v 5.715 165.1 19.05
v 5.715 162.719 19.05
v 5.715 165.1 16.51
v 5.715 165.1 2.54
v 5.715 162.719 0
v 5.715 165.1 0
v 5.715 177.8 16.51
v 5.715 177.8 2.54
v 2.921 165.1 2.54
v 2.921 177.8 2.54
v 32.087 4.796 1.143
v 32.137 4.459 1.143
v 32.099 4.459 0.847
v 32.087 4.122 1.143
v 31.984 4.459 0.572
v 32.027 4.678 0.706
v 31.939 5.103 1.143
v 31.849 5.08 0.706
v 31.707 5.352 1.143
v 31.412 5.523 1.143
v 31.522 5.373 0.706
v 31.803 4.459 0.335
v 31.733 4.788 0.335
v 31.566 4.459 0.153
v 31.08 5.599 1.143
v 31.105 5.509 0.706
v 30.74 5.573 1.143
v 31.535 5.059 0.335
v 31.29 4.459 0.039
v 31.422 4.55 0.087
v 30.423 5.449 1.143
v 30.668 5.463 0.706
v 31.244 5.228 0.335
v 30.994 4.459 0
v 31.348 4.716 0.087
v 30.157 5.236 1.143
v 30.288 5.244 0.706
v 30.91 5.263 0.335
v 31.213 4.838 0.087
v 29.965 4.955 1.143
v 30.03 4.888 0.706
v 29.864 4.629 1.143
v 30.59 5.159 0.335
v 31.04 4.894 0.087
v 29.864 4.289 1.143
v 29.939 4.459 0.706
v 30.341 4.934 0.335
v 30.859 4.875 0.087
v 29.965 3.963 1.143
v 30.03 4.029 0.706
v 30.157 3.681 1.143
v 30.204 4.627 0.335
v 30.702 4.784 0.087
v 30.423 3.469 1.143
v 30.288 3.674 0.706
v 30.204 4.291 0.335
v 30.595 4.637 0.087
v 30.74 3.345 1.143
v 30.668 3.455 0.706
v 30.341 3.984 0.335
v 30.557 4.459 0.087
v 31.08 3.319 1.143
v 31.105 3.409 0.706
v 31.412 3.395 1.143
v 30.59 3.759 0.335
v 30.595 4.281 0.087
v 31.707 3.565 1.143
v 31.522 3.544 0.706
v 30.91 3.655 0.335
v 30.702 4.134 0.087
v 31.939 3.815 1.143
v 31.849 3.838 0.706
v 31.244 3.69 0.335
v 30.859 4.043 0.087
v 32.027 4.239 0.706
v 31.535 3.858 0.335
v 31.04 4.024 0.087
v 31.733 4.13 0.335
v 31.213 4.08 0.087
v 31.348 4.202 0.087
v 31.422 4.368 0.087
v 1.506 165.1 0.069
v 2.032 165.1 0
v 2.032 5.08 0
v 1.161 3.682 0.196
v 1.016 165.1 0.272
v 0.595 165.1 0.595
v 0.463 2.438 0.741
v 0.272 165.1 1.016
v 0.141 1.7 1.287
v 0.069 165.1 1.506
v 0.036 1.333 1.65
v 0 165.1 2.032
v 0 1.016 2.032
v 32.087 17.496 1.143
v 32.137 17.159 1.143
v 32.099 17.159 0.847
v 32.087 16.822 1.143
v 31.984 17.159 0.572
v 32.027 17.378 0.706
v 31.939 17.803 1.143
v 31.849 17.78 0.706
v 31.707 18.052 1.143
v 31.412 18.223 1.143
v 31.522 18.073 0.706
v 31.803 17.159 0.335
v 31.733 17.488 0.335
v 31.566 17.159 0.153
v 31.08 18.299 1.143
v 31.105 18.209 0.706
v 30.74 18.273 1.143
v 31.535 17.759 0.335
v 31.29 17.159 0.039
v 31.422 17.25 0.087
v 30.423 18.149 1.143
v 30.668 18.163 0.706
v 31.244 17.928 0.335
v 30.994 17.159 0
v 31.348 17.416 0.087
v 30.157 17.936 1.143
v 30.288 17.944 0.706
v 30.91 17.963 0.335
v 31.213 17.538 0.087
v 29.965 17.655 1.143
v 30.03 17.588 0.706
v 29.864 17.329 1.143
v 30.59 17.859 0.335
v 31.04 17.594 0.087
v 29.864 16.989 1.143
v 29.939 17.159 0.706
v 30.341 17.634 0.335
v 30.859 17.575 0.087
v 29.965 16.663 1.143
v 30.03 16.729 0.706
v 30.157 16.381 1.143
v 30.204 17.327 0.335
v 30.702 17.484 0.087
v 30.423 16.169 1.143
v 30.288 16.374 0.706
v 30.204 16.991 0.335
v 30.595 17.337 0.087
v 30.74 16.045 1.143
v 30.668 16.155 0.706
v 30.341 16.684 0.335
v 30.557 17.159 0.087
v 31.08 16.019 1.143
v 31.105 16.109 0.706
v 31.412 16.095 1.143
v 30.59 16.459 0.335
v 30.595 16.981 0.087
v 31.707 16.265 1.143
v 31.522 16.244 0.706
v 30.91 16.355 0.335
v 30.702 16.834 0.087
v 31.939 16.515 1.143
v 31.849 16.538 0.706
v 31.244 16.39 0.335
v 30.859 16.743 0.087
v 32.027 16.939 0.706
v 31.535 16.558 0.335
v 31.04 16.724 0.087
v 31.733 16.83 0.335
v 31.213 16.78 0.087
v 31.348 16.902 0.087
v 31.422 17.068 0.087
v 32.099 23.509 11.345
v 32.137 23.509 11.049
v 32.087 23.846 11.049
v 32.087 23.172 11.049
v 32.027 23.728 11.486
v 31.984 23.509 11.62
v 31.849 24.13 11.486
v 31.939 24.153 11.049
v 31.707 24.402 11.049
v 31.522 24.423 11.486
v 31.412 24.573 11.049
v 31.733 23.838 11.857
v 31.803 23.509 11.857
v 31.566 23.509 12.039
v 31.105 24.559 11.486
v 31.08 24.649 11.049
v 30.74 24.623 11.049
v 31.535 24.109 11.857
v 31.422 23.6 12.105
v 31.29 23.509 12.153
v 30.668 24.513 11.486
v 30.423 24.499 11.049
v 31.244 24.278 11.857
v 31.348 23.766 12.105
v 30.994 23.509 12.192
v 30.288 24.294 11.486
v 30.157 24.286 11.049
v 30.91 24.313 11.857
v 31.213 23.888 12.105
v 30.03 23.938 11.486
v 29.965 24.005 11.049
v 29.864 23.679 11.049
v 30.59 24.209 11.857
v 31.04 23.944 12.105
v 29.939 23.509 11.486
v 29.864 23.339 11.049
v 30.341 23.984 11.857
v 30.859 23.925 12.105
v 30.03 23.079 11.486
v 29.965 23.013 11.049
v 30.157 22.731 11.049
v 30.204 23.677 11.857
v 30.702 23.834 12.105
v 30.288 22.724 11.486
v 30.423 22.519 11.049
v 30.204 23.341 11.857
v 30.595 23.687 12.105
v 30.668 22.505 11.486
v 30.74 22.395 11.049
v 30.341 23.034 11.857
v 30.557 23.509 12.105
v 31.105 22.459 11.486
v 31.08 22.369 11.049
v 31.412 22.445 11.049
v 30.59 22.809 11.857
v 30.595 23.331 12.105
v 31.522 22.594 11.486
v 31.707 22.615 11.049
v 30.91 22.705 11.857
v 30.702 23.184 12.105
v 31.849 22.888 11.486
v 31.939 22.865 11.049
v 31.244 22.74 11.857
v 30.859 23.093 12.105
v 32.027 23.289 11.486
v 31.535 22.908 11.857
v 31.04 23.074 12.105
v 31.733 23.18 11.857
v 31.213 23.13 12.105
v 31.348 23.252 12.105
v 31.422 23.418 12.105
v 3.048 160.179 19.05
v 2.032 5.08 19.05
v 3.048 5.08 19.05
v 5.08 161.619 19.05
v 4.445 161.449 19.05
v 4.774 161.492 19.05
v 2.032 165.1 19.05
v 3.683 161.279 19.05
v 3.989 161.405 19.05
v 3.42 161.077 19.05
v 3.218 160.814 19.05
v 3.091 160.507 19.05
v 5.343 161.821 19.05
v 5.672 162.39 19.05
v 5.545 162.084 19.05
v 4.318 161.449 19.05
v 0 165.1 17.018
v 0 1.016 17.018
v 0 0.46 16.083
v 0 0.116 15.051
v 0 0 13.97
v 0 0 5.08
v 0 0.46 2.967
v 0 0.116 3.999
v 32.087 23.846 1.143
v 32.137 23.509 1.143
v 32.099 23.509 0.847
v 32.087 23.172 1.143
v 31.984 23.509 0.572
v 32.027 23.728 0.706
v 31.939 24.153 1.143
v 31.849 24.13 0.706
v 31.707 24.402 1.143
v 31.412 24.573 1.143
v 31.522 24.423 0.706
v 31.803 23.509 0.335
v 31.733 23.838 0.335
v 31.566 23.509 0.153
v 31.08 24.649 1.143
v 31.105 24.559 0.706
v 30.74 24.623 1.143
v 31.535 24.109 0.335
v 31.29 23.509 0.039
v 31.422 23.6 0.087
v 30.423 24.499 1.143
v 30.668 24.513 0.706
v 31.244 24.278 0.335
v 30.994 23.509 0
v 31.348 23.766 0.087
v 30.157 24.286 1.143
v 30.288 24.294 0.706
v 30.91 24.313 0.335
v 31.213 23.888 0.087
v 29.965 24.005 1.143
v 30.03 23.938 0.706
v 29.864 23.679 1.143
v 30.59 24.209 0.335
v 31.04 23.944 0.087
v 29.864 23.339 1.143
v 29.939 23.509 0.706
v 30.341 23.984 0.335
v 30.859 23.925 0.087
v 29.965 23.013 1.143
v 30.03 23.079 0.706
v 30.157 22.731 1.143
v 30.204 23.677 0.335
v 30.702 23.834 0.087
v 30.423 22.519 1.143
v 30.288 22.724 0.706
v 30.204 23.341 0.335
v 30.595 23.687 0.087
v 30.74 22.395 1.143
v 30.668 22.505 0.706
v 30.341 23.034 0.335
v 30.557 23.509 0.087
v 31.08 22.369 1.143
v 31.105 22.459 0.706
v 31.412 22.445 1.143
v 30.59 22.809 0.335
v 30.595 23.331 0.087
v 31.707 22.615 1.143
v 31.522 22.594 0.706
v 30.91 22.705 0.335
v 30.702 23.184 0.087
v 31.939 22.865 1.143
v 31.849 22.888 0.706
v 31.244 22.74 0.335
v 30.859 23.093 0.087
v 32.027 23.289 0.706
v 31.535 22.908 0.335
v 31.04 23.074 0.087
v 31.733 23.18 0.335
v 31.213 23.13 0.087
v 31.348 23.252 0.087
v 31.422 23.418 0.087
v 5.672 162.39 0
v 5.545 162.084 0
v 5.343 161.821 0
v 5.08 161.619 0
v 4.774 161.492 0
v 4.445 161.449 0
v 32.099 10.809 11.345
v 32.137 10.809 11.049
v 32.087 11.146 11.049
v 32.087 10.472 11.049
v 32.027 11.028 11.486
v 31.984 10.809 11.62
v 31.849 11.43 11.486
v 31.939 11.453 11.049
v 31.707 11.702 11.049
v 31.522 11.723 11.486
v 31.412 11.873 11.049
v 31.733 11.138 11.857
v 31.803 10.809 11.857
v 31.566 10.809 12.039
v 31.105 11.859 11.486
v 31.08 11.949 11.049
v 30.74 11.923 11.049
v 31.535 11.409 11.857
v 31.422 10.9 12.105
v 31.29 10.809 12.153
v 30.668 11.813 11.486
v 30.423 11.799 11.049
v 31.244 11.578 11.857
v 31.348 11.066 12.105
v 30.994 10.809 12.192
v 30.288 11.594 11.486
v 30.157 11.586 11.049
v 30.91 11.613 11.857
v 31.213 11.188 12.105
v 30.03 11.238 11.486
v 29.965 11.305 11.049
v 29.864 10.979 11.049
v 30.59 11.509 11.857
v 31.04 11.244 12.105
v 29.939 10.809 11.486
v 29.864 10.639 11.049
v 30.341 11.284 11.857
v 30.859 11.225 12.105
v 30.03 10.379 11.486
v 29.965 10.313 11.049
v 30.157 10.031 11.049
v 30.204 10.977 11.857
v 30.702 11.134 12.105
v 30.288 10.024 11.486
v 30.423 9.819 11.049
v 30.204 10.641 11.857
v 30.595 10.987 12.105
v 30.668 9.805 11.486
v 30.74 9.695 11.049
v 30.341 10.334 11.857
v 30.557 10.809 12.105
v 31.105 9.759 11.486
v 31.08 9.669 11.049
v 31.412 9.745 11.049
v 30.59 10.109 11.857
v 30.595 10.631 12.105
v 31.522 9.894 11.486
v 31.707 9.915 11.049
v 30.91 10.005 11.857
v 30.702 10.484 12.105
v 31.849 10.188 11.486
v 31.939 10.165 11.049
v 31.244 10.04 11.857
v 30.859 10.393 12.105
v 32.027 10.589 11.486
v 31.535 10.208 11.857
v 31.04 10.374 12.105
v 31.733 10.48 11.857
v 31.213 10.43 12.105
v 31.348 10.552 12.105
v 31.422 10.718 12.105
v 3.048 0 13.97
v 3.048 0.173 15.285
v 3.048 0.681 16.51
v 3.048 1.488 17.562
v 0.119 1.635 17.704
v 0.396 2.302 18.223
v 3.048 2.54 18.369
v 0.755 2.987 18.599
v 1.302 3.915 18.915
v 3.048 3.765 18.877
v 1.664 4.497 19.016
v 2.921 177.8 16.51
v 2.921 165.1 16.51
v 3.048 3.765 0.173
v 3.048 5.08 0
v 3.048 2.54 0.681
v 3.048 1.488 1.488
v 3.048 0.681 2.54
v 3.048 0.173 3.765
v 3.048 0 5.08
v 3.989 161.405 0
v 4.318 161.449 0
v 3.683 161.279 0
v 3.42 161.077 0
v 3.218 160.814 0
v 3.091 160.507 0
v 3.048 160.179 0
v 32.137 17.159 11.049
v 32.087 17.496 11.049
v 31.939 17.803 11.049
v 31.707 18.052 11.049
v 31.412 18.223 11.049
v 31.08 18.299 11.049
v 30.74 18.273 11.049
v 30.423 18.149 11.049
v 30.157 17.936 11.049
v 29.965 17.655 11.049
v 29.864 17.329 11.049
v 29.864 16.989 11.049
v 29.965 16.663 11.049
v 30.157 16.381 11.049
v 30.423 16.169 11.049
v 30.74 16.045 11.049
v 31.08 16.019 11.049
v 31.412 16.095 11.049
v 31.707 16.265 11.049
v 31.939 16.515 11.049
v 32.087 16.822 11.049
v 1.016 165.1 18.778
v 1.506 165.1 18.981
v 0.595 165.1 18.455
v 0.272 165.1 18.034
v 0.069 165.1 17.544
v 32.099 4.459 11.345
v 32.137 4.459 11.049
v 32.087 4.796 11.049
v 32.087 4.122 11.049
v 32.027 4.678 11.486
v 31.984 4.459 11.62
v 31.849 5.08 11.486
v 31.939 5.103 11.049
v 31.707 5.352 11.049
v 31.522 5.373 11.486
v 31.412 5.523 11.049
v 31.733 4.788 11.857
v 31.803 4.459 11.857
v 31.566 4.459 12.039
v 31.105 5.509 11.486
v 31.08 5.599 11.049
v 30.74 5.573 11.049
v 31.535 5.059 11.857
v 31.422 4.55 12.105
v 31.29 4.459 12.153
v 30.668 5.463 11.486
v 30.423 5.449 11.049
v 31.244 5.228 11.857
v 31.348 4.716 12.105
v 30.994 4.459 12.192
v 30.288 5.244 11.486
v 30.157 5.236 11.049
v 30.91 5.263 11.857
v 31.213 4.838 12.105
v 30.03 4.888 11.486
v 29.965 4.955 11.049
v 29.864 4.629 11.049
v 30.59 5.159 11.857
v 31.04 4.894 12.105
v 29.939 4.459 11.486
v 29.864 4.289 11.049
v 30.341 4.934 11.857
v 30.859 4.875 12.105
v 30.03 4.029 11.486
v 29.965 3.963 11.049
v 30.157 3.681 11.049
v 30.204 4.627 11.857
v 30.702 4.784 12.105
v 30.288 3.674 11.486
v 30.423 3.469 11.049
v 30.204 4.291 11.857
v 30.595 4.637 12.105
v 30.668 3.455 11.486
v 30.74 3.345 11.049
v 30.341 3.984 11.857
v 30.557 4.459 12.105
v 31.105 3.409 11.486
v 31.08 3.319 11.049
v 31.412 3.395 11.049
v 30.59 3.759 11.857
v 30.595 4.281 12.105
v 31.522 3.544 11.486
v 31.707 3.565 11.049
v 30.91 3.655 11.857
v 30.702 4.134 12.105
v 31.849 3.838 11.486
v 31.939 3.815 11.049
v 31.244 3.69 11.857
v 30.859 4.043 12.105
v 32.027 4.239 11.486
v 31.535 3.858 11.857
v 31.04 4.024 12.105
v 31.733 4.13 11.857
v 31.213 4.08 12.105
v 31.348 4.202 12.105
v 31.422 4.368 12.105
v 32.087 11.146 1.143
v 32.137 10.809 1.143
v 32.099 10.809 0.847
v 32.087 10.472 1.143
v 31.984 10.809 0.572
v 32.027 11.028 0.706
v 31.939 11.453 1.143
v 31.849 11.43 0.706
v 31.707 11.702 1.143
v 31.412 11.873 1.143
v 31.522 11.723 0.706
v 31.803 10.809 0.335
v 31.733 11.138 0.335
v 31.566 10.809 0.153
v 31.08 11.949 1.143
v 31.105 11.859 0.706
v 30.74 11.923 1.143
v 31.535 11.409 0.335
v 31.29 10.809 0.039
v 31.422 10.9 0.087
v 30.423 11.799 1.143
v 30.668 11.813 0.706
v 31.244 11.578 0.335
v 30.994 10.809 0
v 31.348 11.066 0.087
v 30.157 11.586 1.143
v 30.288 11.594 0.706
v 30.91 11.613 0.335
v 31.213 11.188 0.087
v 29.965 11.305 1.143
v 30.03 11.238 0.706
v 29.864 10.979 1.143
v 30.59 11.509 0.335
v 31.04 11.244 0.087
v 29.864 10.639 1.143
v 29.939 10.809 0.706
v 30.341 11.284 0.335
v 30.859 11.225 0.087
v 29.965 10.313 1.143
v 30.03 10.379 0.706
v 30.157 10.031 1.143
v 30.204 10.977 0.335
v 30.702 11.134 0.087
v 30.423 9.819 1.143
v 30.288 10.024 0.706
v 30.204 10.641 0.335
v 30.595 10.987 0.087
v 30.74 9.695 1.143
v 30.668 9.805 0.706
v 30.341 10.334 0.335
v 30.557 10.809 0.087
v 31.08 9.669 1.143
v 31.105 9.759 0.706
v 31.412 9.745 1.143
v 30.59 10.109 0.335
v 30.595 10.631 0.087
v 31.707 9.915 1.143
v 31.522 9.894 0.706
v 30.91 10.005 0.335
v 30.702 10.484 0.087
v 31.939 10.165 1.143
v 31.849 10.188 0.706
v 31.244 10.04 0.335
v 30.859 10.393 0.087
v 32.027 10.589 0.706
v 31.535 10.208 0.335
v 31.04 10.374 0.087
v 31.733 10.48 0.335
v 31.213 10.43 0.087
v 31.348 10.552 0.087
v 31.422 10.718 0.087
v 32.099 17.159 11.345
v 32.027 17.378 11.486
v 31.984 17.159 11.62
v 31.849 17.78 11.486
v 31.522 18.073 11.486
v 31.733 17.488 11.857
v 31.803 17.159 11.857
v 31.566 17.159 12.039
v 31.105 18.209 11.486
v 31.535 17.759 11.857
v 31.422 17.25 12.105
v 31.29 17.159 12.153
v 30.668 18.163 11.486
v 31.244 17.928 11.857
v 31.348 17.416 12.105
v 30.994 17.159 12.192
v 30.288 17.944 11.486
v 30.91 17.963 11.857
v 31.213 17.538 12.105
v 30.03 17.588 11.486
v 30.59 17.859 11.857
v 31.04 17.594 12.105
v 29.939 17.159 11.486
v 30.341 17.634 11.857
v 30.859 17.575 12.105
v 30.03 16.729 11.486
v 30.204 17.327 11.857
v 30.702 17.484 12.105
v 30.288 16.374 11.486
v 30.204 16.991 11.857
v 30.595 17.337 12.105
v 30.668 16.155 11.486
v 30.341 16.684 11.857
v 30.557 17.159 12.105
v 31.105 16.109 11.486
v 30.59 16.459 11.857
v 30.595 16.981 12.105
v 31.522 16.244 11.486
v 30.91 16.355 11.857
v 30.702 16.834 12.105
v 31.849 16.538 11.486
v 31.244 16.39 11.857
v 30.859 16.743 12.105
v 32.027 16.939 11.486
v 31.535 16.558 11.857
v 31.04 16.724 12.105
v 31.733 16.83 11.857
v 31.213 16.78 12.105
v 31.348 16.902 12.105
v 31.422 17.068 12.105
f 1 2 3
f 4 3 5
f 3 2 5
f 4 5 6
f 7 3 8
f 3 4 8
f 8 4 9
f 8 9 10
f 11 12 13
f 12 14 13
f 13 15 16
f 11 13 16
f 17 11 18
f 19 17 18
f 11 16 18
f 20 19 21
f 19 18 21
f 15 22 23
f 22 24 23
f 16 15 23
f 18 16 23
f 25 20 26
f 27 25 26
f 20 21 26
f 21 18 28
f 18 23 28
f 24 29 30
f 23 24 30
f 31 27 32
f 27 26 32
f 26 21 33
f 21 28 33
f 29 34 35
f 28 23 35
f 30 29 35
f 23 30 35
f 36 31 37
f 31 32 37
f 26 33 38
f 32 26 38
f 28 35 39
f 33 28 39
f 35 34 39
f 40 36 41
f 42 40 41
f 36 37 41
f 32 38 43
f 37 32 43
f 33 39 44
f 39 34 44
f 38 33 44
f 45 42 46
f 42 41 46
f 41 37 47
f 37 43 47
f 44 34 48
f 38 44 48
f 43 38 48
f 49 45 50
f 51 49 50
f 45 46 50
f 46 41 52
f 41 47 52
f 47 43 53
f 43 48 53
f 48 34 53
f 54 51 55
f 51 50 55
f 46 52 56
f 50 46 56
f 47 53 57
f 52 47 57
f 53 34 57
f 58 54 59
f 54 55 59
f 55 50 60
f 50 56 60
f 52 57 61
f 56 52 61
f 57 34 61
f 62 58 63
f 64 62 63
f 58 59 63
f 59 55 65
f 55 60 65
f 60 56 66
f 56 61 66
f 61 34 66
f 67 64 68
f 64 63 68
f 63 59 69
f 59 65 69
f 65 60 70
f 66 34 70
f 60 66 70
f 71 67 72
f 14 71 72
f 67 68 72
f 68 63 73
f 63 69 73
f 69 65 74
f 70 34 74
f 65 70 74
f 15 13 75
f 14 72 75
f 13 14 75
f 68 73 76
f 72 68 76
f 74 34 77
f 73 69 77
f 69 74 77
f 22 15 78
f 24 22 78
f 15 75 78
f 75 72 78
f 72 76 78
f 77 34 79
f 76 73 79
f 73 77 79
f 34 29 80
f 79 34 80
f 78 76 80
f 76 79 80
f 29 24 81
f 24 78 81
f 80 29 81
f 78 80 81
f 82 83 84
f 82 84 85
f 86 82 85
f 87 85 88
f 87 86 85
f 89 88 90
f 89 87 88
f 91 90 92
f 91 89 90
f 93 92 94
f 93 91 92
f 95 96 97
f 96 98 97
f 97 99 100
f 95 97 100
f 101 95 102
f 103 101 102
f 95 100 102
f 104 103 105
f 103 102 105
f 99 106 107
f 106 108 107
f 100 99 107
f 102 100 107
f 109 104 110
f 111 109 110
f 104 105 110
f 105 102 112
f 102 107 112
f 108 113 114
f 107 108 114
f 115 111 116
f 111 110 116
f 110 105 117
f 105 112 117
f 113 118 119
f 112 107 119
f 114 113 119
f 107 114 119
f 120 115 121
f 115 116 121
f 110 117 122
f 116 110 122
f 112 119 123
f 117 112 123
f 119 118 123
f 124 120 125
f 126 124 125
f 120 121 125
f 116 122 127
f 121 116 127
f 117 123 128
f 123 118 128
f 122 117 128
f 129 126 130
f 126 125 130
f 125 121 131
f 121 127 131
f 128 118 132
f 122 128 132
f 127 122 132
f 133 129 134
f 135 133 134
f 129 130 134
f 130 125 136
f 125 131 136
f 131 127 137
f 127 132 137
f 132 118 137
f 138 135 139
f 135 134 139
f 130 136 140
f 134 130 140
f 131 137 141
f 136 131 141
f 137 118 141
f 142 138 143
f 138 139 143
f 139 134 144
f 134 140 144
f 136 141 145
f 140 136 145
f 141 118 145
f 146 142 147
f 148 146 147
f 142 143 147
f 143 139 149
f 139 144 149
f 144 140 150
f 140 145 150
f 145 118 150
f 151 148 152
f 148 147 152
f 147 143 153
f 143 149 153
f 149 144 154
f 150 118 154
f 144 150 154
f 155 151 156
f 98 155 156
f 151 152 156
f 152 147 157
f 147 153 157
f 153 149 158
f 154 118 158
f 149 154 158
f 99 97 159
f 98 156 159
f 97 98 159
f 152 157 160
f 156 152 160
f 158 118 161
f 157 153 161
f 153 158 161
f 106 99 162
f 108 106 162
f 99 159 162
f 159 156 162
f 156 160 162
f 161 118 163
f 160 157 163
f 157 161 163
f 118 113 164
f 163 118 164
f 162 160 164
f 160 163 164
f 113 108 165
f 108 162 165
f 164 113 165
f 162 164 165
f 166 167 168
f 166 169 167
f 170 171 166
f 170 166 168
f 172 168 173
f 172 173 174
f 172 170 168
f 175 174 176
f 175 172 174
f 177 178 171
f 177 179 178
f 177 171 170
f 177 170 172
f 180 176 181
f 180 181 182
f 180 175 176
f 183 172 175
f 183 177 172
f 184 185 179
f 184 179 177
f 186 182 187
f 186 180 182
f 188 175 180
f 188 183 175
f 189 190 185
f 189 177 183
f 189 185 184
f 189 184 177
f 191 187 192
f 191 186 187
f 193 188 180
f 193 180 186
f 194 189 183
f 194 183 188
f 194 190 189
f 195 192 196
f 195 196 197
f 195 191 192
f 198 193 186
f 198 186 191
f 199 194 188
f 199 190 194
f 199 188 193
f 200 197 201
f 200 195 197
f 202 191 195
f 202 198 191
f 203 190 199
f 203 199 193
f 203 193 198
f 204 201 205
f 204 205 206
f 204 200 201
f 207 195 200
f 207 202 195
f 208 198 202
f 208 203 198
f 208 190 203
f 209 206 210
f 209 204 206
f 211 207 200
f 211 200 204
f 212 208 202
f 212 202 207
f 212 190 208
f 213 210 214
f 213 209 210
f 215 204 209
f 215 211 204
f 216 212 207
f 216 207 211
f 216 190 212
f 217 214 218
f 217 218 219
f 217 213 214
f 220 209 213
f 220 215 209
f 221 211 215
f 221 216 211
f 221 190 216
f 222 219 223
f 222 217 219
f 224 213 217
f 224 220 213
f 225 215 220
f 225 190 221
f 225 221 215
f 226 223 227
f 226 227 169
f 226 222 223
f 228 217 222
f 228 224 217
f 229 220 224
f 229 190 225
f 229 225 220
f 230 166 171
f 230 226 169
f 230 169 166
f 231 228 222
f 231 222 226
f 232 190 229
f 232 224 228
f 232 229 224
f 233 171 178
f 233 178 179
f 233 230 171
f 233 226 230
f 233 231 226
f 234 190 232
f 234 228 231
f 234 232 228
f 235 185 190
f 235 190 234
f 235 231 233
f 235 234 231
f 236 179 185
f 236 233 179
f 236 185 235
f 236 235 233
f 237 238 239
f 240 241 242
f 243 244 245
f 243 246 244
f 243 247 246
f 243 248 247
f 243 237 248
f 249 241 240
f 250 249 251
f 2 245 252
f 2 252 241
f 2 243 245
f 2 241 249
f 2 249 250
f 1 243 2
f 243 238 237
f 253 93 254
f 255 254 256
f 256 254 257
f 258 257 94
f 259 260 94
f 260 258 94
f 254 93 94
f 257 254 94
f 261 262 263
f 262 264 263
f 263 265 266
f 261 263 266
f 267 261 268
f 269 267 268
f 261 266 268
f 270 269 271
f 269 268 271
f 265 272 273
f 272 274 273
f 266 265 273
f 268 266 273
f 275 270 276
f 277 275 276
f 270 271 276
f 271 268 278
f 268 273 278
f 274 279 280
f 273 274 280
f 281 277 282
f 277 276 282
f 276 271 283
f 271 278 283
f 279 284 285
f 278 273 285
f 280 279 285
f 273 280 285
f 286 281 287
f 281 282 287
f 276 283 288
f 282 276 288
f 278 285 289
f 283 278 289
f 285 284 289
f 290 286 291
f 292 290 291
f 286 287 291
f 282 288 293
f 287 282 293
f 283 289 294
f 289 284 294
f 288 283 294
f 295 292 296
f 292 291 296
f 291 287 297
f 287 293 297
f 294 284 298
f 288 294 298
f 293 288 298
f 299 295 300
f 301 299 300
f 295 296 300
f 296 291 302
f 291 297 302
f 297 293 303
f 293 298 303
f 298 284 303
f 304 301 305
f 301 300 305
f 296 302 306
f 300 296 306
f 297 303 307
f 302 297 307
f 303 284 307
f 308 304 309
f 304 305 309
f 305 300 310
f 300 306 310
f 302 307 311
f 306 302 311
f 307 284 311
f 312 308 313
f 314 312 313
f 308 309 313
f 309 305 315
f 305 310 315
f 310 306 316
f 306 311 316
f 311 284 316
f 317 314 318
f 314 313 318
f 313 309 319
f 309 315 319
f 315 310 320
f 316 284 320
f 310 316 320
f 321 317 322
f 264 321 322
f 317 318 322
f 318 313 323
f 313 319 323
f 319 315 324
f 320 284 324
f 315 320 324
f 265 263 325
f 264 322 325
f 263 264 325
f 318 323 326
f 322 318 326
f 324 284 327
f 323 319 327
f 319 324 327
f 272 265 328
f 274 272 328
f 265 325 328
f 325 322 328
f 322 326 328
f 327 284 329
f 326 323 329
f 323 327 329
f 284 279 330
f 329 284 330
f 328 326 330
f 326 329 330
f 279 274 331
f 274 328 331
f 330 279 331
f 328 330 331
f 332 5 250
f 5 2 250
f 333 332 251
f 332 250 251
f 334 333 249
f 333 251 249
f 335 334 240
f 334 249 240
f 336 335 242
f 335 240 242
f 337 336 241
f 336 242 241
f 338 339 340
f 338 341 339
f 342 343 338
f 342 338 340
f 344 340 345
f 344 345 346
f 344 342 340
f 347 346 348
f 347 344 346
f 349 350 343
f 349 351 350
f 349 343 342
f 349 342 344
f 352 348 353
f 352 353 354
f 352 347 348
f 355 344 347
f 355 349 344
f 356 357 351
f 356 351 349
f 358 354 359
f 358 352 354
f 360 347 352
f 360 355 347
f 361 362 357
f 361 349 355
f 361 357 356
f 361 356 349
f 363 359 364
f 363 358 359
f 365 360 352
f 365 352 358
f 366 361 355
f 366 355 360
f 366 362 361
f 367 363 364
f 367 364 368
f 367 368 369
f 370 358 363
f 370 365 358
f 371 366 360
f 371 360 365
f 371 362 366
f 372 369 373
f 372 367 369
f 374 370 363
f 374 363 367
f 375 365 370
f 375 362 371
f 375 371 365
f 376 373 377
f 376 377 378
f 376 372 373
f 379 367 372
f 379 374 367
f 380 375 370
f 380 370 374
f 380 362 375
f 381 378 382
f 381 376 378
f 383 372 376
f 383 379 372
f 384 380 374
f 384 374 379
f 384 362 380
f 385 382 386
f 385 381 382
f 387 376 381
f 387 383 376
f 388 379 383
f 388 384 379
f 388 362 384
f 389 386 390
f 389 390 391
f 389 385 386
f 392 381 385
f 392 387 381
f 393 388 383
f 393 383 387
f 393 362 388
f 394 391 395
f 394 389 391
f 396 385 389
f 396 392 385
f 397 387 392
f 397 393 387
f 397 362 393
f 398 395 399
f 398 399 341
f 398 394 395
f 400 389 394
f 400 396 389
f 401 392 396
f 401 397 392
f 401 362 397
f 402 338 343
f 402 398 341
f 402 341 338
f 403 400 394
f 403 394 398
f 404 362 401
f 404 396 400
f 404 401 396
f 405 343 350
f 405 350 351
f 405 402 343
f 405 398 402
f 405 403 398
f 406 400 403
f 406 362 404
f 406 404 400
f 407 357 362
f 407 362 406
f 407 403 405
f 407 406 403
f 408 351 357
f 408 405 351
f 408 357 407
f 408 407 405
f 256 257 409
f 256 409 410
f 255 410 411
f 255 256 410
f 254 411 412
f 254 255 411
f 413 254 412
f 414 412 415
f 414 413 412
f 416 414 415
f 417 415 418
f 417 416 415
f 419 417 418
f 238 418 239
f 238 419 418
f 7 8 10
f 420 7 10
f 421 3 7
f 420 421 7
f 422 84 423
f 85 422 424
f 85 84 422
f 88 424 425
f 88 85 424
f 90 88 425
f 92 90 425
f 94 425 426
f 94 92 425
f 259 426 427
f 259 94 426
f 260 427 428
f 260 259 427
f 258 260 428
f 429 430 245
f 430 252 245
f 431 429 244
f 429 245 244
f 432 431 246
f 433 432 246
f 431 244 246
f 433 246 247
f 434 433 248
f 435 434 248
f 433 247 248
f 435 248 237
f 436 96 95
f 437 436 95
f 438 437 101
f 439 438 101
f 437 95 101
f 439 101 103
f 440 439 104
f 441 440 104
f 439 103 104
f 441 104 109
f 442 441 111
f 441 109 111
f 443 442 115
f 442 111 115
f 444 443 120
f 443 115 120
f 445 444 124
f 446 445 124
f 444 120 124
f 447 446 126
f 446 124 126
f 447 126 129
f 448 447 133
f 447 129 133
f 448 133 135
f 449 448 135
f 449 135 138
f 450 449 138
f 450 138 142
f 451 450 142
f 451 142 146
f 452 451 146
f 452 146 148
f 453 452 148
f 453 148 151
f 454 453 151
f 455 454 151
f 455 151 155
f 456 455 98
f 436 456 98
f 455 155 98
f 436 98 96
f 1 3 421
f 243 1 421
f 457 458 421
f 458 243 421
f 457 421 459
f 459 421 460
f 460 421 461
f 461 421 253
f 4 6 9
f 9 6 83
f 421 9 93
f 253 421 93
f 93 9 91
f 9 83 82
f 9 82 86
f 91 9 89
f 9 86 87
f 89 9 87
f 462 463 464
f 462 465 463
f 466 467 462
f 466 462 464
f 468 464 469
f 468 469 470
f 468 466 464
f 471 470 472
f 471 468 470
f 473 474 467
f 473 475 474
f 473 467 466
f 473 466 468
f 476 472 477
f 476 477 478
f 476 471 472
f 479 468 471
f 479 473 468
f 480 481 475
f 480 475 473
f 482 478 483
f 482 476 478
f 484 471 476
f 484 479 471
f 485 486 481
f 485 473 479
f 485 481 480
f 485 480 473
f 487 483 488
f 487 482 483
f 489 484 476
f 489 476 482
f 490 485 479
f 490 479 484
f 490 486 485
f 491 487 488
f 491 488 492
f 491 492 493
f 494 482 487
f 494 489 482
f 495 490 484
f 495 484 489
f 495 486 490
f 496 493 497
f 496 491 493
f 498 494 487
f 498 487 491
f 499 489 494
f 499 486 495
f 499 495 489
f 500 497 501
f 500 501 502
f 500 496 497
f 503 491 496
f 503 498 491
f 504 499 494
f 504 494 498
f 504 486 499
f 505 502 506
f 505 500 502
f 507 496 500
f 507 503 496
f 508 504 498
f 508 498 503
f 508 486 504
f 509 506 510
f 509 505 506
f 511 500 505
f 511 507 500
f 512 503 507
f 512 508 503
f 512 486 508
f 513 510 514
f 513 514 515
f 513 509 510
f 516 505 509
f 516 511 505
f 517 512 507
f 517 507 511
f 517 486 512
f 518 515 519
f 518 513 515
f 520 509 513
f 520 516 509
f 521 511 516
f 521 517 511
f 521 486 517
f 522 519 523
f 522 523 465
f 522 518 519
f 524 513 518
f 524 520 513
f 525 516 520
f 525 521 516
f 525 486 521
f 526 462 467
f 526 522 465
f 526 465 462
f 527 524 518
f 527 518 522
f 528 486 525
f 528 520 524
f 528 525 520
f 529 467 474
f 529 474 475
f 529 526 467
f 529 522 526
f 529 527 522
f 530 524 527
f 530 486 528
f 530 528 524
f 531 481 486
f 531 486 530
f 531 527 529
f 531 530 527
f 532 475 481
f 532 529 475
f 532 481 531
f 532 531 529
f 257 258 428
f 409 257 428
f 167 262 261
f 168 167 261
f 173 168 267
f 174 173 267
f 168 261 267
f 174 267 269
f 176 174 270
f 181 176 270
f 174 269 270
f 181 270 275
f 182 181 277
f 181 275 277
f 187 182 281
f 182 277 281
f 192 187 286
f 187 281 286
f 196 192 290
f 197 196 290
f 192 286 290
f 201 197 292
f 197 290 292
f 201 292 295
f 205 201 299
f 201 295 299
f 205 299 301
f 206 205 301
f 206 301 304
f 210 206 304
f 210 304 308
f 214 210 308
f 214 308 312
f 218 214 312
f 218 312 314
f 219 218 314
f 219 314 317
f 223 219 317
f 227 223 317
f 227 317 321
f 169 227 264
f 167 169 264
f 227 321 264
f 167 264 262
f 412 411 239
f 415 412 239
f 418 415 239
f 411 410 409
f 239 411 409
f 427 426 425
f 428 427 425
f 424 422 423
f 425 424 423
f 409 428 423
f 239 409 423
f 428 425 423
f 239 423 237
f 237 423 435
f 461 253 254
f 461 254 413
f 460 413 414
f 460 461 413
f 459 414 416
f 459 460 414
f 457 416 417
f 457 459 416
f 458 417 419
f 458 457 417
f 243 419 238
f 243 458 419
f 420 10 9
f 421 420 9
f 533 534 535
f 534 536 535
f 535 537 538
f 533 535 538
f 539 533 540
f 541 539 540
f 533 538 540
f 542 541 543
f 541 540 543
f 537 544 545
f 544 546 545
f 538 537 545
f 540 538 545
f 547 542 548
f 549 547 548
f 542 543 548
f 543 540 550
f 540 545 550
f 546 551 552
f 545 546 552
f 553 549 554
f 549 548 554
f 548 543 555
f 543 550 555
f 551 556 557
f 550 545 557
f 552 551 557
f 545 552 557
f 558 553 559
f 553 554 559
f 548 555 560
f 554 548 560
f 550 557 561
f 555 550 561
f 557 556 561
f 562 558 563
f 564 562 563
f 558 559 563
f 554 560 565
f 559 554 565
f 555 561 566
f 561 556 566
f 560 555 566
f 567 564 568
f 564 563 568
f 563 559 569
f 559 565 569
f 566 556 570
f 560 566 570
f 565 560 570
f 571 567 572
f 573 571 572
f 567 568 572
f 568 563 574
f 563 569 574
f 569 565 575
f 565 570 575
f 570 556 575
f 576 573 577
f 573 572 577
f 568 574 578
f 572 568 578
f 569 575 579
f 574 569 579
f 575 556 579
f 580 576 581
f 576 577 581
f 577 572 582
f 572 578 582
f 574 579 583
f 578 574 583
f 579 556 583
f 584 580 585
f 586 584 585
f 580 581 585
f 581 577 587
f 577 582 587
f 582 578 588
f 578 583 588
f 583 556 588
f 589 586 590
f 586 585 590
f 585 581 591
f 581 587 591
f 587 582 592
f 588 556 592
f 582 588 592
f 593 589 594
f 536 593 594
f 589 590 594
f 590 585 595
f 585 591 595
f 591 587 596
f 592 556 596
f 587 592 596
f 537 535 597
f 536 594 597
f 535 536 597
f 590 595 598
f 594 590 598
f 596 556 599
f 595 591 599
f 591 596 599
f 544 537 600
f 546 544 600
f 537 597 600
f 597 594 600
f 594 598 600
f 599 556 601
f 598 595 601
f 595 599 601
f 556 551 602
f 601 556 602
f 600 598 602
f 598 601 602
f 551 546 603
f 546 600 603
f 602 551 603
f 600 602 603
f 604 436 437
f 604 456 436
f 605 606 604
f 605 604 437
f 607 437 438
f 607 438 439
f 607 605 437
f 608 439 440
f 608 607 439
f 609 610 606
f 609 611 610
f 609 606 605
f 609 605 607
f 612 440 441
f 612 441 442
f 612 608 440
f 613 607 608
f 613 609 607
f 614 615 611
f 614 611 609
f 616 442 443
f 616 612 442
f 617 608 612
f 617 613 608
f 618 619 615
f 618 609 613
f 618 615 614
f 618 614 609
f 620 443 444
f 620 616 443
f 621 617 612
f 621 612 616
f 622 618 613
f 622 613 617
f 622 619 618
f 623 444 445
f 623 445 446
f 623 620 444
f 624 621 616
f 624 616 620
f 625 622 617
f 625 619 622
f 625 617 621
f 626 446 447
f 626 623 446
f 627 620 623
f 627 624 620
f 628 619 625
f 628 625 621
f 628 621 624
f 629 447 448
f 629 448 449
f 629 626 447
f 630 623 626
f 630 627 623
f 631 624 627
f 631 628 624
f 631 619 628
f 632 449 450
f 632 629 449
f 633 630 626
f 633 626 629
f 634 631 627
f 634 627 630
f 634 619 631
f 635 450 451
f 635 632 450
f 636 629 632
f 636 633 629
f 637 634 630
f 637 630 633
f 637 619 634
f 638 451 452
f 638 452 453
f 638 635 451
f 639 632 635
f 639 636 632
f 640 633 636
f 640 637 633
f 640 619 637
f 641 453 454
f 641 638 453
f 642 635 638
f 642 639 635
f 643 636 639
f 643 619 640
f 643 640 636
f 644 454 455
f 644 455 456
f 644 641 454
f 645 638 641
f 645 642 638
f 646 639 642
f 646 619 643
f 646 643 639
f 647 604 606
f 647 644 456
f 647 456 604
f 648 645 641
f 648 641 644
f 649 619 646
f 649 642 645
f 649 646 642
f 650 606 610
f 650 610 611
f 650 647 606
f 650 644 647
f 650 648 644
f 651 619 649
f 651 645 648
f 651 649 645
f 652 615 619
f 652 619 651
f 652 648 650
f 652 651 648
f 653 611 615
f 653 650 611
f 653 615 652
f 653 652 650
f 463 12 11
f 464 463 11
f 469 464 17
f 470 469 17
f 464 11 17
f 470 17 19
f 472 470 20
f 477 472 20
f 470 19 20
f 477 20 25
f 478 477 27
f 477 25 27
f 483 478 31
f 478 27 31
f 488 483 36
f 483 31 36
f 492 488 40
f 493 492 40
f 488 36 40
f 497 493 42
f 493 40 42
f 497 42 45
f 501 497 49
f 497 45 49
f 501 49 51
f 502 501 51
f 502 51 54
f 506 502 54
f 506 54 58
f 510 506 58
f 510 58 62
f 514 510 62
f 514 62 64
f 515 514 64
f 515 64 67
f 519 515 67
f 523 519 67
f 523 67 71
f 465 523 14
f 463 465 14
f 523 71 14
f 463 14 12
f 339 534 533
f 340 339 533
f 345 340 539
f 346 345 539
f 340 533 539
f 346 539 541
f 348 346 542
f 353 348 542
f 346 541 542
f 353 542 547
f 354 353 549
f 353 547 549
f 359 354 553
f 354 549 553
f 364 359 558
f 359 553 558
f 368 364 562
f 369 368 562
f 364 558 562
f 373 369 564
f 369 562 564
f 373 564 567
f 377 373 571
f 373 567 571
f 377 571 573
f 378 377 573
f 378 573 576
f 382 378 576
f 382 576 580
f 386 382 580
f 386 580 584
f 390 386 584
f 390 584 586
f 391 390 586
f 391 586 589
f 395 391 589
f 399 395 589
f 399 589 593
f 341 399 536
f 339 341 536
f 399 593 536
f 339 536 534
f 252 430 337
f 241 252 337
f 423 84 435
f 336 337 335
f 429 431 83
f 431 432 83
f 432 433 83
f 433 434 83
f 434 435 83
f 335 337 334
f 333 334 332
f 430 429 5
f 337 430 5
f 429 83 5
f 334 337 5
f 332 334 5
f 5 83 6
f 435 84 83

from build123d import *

# Parameters (mm, degrees)
F1_DEPTH    = 19.05
F2_T1_DEPTH = 28.448
F3_T1_DEPTH = 28.448
F4_R        = 1.27
F5_T1_DEPTH = 170.18
F6_W        = 12.7
F6_H        = 2.54
F7_DEPTH    = 25.4
F8_W        = 12.7
F8_H        = 2.54
F9_DEPTH    = 25.4
F10_R       = 1.143
F11_DEPTH   = 12.192
F12_R       = 1.143
F12_2_R     = 1.143
F12_3_R     = 1.143
F12_4_R     = 1.143


# Not quite as in the source:
# - a fillet or chamfer that OpenCascade refuses, or shapes differently, is made with other operations: its cross-section is extruded or revolved along the edge and cut away or added


with BuildPart() as f1:
    # F0 (on Top) → F1 (new body)
    with BuildSketch(Plane.XY):
        Polygon((0, 165.1), (0, 0), (3.048, 0), (3.048, 161.4486724138), (5.715, 161.4486724138), (5.715, 177.8), (2.921, 177.8), (2.921, 165.1), align=None)
    extrude(amount=F1_DEPTH)

    # F2: fillet of radius 5.08 on 1 edges, made by hand

    # F2_s2 → F2_t1 (cut)
    with BuildSketch(Plane.YZ.offset(-12.7)):
        with BuildLine():
            ThreePointArc((0, 13.97), (1.4878975516, 17.5621024484), (5.08, 19.05))
            Line((5.08, 19.05), (0, 19.05))
            Line((0, 19.05), (0, 13.97))
        make_face()
    extrude(amount=F2_T1_DEPTH, mode=Mode.SUBTRACT)

    # F3: fillet of radius 5.08 on 1 edges, made by hand

    # F3_s2 → F3_t1 (cut)
    with BuildSketch(Plane.YZ.offset(-12.7)):
        with BuildLine():
            ThreePointArc((5.08, 0), (1.4878975516, 1.4878975516), (0, 5.08))
            Line((0, 5.08), (0, 0))
            Line((0, 0), (5.08, 0))
        make_face()
    extrude(amount=F3_T1_DEPTH, mode=Mode.SUBTRACT)

    # F4
    f4_edges = [f1.edges().sort_by_distance(p)[0] for p in [
        (5.715, 161.448672, 9.525),
        (3.048, 161.448672, 9.525),
    ]]
    fillet(f4_edges, radius=F4_R)

    # F5: fillet of radius 2.032 on 2 edges, made by hand

    # F5_s2 → F5_t1 (cut)
    with BuildSketch(Plane.XZ.offset(-170.18)):
        with BuildLine():
            ThreePointArc((0, 17.018), (0.5951590206, 18.4548409794), (2.032, 19.05))
            Line((2.032, 19.05), (0, 19.05))
            Line((0, 19.05), (0, 17.018))
        make_face()
        with BuildLine():
            ThreePointArc((2.032, 0), (0.5951590206, 0.5951590206), (0, 2.032))
            Line((0, 2.032), (0, 0))
            Line((0, 0), (2.032, 0))
        make_face()
    extrude(amount=F5_T1_DEPTH, mode=Mode.SUBTRACT)

    # F6 (on face) → F7 (cut)
    with BuildSketch(Plane.YZ.offset(5.715)):
        with Locations((171.45, 17.78)):
            Rectangle(F6_W, F6_H)
    extrude(amount=-F7_DEPTH, mode=Mode.SUBTRACT)

    # F8 (on face) → F9 (cut)
    with BuildSketch(Plane.YZ.offset(5.715)):
        with Locations((171.45, 1.27)):
            Rectangle(F8_W, F8_H)
    extrude(amount=-F9_DEPTH, mode=Mode.SUBTRACT)


with BuildPart() as f11:
    # F10 (on Top) → F11 (new body)
    with BuildSketch(Plane.XY):
        with Locations((30.9944972396, 4.4588609599)):
            Circle(F10_R)
    extrude(amount=F11_DEPTH)

    # F12
    f12_edges = [f11.edges().sort_by_distance(p)[0] for p in [
        (29.851497, 4.458861, 12.192),
        (29.851497, 4.458861, 0),
    ]]
    fillet(f12_edges, radius=F12_R)


with BuildPart() as f11b:
    # F10 (on Top) → F11, piece 2 (new body)
    with BuildSketch(Plane.XY):
        with Locations((30.9944972396, 10.8088609599)):
            Circle(F10_R)
    extrude(amount=F11_DEPTH)

    # F12#2
    f12_2_edges = [f11b.edges().sort_by_distance(p)[0] for p in [
        (29.851497, 10.808861, 12.192),
        (29.851497, 10.808861, 0),
    ]]
    fillet(f12_2_edges, radius=F12_2_R)


with BuildPart() as f11c:
    # F10 (on Top) → F11, piece 3 (new body)
    with BuildSketch(Plane.XY):
        with Locations((30.9944972396, 17.1588609599)):
            Circle(F10_R)
    extrude(amount=F11_DEPTH)

    # F12#3
    f12_3_edges = [f11c.edges().sort_by_distance(p)[0] for p in [
        (29.851497, 17.158861, 12.192),
        (29.851497, 17.158861, 0),
    ]]
    fillet(f12_3_edges, radius=F12_3_R)


with BuildPart() as f11d:
    # F10 (on Top) → F11, piece 4 (new body)
    with BuildSketch(Plane.XY):
        with Locations((30.9944972396, 23.5088609599)):
            Circle(F10_R)
    extrude(amount=F11_DEPTH)

    # F12#4
    f12_4_edges = [f11d.edges().sort_by_distance(p)[0] for p in [
        (29.851497, 23.508861, 12.192),
        (29.851497, 23.508861, 0),
    ]]
    fillet(f12_4_edges, radius=F12_4_R)


solid = Compound([f1.part, f11.part, f11b.part, f11c.part, f11d.part])
